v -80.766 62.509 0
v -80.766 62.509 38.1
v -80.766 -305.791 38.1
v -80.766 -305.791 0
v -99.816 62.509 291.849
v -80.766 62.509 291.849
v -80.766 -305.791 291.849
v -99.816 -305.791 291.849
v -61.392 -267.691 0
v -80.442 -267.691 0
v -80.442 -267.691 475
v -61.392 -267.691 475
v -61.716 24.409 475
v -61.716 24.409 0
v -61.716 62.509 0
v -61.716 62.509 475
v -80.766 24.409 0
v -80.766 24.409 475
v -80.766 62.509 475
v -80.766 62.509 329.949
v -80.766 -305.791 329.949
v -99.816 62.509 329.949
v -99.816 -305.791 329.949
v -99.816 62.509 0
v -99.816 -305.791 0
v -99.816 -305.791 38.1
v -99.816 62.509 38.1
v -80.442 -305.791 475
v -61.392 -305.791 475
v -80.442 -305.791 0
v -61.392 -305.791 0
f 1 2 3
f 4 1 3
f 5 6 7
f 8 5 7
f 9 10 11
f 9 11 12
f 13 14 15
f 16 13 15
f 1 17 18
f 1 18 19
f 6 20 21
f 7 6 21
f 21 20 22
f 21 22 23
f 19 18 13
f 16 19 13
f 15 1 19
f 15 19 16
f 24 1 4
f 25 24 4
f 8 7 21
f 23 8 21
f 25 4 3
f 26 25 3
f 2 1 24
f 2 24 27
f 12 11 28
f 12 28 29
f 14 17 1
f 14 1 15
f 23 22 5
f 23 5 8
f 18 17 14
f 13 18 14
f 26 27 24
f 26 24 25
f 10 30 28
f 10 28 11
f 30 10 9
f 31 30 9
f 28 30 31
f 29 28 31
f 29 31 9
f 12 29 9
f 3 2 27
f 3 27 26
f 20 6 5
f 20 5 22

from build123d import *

# Parameters (mm, degrees)
F0_W     = 19.05
F0_H     = 38.100007
F1_DEPTH = 475
F2_W     = 19.05
F2_H     = 38.1
F3_DEPTH = 475
F4_W     = 368.3
F4_H     = 38.1
F5_DEPTH = 19.05
F6_W     = 368.3
F6_H     = 38.1
F7_DEPTH = 19.05


with BuildPart() as f1:
    # F0 (on Top) → F1 (new body)
    with BuildSketch(Plane.XY):
        with Locations((-71.241061, 43.458669)):
            Rectangle(F0_W, F0_H)
    extrude(amount=F1_DEPTH)


with BuildPart() as f3:
    # F2 (on Top) → F3 (new body)
    with BuildSketch(Plane.XY):
        with Locations((-70.916706, -286.741328)):
            Rectangle(F2_W, F2_H)
    extrude(amount=F3_DEPTH)


with BuildPart() as f5:
    # F4 (on face) → F5 (new body)
    with BuildSketch(Plane(origin=(-80.766061, 0, 0), x_dir=(0, -1, 0), z_dir=(-1, 0, 0))):
        with Locations((121.641328, 19.05)):
            Rectangle(F4_W, F4_H)
    extrude(amount=F5_DEPTH)


with BuildPart() as f7:
    # F6 (on face) → F7 (new body)
    with BuildSketch(Plane(origin=(-80.766061, 0, 0), x_dir=(0, -1, 0), z_dir=(-1, 0, 0))):
        with Locations((121.641328, 310.899256)):
            Rectangle(F6_W, F6_H)
    extrude(amount=F7_DEPTH)


solid = Compound([f1.part, f3.part, f5.part, f7.part])
